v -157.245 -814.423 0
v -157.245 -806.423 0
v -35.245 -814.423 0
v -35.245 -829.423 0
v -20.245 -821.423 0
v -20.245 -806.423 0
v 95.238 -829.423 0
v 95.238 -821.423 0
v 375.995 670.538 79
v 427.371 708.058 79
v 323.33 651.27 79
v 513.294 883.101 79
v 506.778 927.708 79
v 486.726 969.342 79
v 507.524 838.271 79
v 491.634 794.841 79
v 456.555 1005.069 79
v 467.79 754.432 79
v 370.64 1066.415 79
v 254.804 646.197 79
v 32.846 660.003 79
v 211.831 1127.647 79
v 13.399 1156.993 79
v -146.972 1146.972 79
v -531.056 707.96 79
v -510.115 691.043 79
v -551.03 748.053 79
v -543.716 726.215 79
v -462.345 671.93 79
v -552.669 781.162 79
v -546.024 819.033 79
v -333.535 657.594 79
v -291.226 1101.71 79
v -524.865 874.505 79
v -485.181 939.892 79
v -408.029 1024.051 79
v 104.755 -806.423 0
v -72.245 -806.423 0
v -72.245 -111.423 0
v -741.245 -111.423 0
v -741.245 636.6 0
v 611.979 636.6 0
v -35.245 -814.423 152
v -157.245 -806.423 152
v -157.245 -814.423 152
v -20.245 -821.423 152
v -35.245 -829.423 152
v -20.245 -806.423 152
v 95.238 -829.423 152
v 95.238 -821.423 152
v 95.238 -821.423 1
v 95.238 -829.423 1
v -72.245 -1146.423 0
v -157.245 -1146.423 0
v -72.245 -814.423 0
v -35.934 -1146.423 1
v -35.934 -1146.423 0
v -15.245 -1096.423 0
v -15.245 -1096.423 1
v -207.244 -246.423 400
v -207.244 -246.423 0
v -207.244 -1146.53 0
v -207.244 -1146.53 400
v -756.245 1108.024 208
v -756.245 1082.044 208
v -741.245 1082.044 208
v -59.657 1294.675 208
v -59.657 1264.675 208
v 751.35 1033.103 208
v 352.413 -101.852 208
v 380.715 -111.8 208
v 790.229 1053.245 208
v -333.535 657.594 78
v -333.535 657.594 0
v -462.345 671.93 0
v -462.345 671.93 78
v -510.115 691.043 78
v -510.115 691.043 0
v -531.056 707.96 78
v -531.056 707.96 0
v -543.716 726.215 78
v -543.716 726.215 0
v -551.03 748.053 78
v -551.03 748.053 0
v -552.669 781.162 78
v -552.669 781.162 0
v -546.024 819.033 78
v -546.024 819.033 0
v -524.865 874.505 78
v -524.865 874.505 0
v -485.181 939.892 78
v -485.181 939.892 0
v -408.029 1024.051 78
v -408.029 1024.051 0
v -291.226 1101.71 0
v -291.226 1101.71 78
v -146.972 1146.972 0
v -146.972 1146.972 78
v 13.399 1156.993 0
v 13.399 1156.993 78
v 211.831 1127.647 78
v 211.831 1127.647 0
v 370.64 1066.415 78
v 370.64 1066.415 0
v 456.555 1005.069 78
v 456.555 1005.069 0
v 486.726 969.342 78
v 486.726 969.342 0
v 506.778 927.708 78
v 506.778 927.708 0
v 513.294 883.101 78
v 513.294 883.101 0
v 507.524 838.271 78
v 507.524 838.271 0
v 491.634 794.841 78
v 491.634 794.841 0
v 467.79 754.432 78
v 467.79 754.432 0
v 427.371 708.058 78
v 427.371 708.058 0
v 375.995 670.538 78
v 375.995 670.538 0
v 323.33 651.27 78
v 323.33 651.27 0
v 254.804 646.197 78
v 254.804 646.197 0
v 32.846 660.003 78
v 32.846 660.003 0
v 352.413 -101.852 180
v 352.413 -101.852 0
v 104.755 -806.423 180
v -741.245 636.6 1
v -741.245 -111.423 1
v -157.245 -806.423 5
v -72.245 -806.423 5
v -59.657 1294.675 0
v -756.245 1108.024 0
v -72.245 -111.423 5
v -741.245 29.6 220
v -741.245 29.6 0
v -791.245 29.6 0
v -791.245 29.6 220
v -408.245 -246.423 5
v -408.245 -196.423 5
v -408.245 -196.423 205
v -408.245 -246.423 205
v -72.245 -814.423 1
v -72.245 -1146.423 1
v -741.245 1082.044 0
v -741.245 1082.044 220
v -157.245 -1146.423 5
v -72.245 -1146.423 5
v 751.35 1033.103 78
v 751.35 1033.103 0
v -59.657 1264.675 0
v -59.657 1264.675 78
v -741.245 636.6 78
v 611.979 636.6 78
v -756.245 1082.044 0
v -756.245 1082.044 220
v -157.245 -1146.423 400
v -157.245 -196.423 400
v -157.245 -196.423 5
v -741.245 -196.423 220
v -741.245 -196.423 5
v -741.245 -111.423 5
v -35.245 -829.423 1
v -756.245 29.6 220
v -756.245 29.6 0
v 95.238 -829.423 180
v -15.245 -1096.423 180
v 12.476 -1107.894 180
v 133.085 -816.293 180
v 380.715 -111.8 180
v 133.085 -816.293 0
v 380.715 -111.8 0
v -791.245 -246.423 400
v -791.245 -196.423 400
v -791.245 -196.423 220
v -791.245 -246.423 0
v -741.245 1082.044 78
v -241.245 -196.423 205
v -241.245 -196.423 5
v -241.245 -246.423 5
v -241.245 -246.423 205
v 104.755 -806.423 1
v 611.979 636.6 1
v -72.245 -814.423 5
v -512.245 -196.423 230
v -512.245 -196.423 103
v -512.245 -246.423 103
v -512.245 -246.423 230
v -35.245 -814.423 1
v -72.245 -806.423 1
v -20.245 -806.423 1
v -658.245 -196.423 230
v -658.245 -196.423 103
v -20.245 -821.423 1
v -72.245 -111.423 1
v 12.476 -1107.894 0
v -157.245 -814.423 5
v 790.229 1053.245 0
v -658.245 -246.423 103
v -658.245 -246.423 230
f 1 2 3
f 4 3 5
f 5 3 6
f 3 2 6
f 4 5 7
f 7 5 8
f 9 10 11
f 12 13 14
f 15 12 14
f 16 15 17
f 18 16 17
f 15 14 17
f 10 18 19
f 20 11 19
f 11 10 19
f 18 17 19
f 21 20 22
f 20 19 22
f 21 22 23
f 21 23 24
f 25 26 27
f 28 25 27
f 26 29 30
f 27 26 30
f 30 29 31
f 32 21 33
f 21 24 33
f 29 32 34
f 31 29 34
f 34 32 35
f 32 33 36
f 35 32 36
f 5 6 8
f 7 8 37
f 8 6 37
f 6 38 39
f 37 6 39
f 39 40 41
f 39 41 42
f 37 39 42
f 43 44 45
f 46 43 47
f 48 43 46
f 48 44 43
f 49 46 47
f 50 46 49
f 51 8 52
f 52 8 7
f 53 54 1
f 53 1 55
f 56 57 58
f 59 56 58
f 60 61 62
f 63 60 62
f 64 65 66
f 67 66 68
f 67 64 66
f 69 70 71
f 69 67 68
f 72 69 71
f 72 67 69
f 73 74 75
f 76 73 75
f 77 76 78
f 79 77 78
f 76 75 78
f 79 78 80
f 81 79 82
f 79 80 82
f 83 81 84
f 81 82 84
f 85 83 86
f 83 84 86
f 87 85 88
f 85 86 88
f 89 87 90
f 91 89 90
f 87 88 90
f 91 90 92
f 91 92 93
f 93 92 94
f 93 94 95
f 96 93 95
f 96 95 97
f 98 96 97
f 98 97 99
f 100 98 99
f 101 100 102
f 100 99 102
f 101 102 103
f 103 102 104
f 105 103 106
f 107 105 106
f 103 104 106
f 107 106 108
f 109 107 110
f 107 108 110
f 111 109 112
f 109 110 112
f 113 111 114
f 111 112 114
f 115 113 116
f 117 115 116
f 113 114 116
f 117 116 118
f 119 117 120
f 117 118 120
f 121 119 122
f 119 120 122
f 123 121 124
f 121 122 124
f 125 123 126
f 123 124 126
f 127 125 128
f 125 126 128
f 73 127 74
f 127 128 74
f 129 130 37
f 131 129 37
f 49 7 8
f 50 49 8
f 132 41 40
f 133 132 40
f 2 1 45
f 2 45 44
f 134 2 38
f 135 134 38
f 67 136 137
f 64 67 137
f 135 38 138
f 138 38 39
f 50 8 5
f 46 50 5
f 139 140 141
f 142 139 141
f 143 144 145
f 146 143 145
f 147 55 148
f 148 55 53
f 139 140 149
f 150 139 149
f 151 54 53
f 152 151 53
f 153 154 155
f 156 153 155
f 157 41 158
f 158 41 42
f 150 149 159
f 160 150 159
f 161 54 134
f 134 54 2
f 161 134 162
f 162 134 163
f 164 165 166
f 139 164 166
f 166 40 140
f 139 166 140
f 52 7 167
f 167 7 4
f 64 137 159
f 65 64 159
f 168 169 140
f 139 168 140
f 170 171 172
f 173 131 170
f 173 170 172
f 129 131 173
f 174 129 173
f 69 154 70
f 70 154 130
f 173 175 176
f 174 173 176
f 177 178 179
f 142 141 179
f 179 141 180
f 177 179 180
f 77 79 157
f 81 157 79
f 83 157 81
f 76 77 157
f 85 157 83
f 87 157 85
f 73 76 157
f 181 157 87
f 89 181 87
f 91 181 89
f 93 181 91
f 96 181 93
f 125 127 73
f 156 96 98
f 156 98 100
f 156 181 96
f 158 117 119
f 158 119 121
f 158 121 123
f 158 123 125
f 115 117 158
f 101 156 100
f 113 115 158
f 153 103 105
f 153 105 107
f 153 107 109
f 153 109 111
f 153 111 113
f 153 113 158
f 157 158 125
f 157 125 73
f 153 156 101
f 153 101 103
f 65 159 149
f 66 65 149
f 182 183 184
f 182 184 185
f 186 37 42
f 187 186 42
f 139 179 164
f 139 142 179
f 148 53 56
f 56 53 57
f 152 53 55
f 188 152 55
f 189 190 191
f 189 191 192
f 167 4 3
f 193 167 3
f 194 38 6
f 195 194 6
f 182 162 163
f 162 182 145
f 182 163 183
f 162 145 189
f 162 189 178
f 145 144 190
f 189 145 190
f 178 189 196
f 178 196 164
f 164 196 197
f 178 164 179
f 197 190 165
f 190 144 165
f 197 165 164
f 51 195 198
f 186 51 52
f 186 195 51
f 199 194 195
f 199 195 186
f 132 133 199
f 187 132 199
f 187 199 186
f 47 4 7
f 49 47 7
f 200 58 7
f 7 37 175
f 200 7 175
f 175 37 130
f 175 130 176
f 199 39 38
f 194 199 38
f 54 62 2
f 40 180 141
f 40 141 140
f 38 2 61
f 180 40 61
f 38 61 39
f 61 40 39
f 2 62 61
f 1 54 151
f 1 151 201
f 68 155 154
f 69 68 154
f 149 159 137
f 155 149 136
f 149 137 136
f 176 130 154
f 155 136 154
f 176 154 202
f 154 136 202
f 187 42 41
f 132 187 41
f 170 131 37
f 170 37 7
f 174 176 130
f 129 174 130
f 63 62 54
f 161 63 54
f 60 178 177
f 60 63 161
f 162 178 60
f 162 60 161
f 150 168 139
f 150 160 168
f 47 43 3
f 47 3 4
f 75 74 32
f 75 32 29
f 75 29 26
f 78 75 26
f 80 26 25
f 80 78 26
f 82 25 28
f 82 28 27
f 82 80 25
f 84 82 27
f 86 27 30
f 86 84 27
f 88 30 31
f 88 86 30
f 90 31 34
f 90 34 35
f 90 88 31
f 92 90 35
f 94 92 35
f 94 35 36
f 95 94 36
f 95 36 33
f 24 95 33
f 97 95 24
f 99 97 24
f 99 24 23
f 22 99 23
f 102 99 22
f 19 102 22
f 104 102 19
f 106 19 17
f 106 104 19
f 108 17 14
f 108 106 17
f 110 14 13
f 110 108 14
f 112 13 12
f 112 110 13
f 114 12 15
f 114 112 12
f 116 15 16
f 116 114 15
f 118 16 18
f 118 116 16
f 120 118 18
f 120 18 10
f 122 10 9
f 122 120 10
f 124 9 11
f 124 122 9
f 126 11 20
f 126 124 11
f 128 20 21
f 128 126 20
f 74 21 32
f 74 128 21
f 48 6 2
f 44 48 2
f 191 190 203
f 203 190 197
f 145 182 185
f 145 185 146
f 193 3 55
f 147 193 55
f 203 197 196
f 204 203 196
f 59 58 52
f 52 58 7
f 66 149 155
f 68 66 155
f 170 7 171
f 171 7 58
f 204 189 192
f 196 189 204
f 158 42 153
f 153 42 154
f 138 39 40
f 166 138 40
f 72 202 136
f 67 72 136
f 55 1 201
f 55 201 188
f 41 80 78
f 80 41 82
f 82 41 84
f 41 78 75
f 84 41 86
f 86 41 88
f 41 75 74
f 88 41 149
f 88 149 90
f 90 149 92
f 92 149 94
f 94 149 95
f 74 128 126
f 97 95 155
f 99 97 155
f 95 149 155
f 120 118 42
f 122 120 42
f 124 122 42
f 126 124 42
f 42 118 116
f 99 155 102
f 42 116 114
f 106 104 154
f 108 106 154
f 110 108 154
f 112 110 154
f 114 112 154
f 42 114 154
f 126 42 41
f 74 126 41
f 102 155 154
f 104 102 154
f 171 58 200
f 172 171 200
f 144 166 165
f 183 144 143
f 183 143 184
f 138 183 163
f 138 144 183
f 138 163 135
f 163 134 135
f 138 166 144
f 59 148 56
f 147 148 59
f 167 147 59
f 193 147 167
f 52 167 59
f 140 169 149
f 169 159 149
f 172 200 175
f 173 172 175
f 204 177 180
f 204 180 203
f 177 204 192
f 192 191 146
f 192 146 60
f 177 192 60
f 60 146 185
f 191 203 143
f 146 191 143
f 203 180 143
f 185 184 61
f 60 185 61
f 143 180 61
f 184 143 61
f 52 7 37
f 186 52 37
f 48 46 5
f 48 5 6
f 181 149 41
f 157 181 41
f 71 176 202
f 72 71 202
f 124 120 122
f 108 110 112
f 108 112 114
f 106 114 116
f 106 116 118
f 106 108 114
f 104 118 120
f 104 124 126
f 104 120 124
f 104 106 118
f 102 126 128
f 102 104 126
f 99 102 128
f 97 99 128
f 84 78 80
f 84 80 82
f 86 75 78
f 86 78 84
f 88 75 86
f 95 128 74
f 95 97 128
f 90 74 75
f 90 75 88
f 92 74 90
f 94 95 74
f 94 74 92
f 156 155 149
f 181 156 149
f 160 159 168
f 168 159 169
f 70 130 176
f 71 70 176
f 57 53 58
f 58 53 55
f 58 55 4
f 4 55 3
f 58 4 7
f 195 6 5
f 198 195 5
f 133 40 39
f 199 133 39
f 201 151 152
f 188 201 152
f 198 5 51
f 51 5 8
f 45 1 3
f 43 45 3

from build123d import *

# Parameters (mm, degrees)
F1_DEPTH  = 78
F2_DEPTH  = 5
F0_W      = 85
F0_H      = 332
F3_DEPTH  = 220
F4_DEPTH  = 220
F5_DEPTH  = 400
F6_W      = 167
F6_H      = 200
F6_W_2    = 146
F6_H_2    = 127
F7_DEPTH  = 200
F8_DEPTH  = 208
F9_DEPTH  = 180
F0_H_2    = 8
F0_W_2    = 37
F10_DEPTH = 152
F11_DEPTH = 79
F12_DEPTH = 1
F13_DEPTH = 1


# Not quite as in the source:
# - a feature names something its author has since deleted; it is built from what else it names


with BuildPart() as f1:
    # F0 (on Top) → F1 (new body)
    with BuildSketch(Plane.XY):
        Polygon((-741.2445402145, 1082.0436550353), (-741.2445402145, 636.6001187265), (85.7554597855, 636.6001187265), (611.9789830182, 636.6001187265), (751.3498777895, 1033.1027120147), (-59.6568852941, 1264.6745167422), align=None)
        with BuildLine():
            add(Edge.make_bspline(
                [(-333.5347517591, 657.5935368718), (-438.7176092773, 660.9860382691), (-660.4423976157, 691.4819966509), (-306.0983067038, 1304.6981771282), (678.1962489209, 1041.8383423681), (388.5420616008, 608.4940348272), (127.1086766673, 676.0293060865), (-184.2398763148, 652.7782743329), (-333.5347517591, 657.5935368718)],
                knots=[0, 0, 0, 0, 0.1269070803, 0.3114768491, 0.5429923215, 0.687036639, 0.8198701082, 1, 1, 1, 1], degree=3))
        make_face(mode=Mode.SUBTRACT)
    extrude(amount=F1_DEPTH)


with BuildPart() as f2:
    # F0 (on Top) → F2 (new body)
    with BuildSketch(Plane.XY):
        Polygon((-157.2445402145, -196.4231370871), (-157.2445402145, -333.8946764966), (-157.2445402145, -806.4231370871), (-72.2445402145, -806.4231370871), (-72.2445402145, -360.4946641021), (-72.2445402145, -111.4231370871), (-741.2445402145, -111.4231370871), (-741.2445402145, -196.4231370871), align=None)
    extrude(amount=F2_DEPTH)

    # F0 (on Top) → F3 (join)
    with BuildSketch(Plane.XY):
        Polygon((-791.2445402145, -196.4231370871), (-741.2445402145, -196.4231370871), (-741.2445402145, -111.4231370871), (-741.2445402145, 29.6001187267), (-756.2445402145, 29.6001187267), (-791.2445402145, 29.6001187267), align=None)
    extrude(amount=F3_DEPTH)

    # F0 (on Top) → F5 (join)
    with BuildSketch(Plane.XY):
        Polygon((-157.2445402145, -806.4231370871), (-157.2445402145, -333.8946764966), (-157.2445402145, -196.4231370871), (-741.2445402145, -196.4231370871), (-791.2445402145, -196.4231370871), (-791.2445402145, -246.4231370871), (-207.2444250903, -246.4231370871), (-207.2444250903, -1146.5304329774), (-157.2445402145, -1146.4231370871), (-157.2445402145, -814.4231370871), align=None)
    extrude(amount=F5_DEPTH)

    # F6 (on face) → F7 (cut)
    with BuildSketch(Plane(origin=(0, -196.4231370871, 0), x_dir=(-1, 0, 0), z_dir=(0, 1, 0))):
        with Locations((324.7445402145, 105)):
            Rectangle(F6_W, F6_H)
        with Locations((585.2445402145, 166.5)):
            Rectangle(F6_W_2, F6_H_2)
    extrude(amount=-F7_DEPTH, mode=Mode.SUBTRACT)


with BuildPart() as f2b:
    # F0 (on Top) → F2, piece 2 (new body)
    with BuildSketch(Plane.XY):
        with Locations((-114.7445402145, -980.4231370871)):
            Rectangle(F0_W, F0_H)
    extrude(amount=F2_DEPTH)


with BuildPart() as f4:
    # F0 (on Top) → F4 (new body)
    with BuildSketch(Plane.XY):
        Polygon((-756.2445402145, 29.6001187267), (-741.2445402145, 29.6001187267), (-741.2445402145, 636.6001187265), (-741.2445402145, 1082.0436550353), (-756.2445402145, 1082.0436550353), align=None)
    extrude(amount=F4_DEPTH)


with BuildPart() as f8:
    # F0 (on Top) → F8 (new body)
    with BuildSketch(Plane.XY):
        Polygon((-756.2445402145, 1082.0436550353), (-741.2445402145, 1082.0436550353), (-59.6568852941, 1264.6745167422), (751.3498777895, 1033.1027120147), (611.9789830182, 636.6001187265), (536.7554597855, 422.5932983858), (352.412635156, -101.8519822417), (380.7150506744, -111.8002979444), (790.2292767004, 1053.2451157589), (-59.6568852941, 1294.6745167422), (-756.2445402145, 1108.0244171488), align=None)
    extrude(amount=F8_DEPTH)


with BuildPart() as f9:
    # F0 (on Top) → F9 (new body)
    with BuildSketch(Plane.XY):
        Polygon((95.2382184061, -829.4231370871), (-15.2445402145, -1096.4231370871), (12.4759647581, -1107.8936908689), (133.0854861388, -816.292767618), (380.7150506744, -111.8002979444), (352.412635156, -101.8519822417), (104.7554597855, -806.4231370871), align=None)
    extrude(amount=F9_DEPTH)


with BuildPart() as f10:
    # F0 (on Top) → F10 (new body)
    with BuildSketch(Plane.XY):
        with Locations((-114.7445402145, -810.4231370871)):
            Rectangle(F0_W, F0_H_2)
        with Locations((-53.7445402145, -810.4231370871)):
            Rectangle(F0_W_2, F0_H_2)
        Polygon((-20.2445402145, -821.4231370871), (-35.2445402145, -821.4231370871), (-35.2445402145, -829.4231370871), (95.2382184061, -829.4231370871), (95.2382184061, -821.4231370871), align=None)
        Polygon((-20.2445402145, -806.4231370871), (-35.2445402145, -806.4231370871), (-35.2445402145, -814.4231370871), (-35.2445402145, -821.4231370871), (-20.2445402145, -821.4231370871), align=None)
    extrude(amount=F10_DEPTH)


with BuildPart() as f11:
    # F0 (on Top) → F11 (new body)
    with BuildSketch(Plane.XY):
        with BuildLine():
            add(Edge.make_bspline(
                [(-333.5347517591, 657.5935368718), (-438.7176092773, 660.9860382691), (-660.4423976157, 691.4819966509), (-306.0983067038, 1304.6981771282), (678.1962489209, 1041.8383423681), (388.5420616008, 608.4940348272), (127.1086766673, 676.0293060865), (-184.2398763148, 652.7782743329), (-333.5347517591, 657.5935368718)],
                knots=[0, 0, 0, 0, 0.1269070803, 0.3114768491, 0.5429923215, 0.687036639, 0.8198701082, 1, 1, 1, 1], degree=3))
        make_face()
    extrude(amount=F11_DEPTH)


with BuildPart() as f12:
    # F0 (on Top) → F12 (new body)
    with BuildSketch(Plane.XY):
        Polygon((-72.2445402145, -360.4946641021), (-72.2445402145, -806.4231370871), (-35.2445402145, -806.4231370871), (-20.2445402145, -806.4231370871), (-20.2445402145, -821.4231370871), (95.2382184061, -821.4231370871), (95.2382184061, -829.4231370871), (104.7554597855, -806.4231370871), (352.412635156, -101.8519822417), (536.7554597855, 422.5932983858), (430.7554597855, 422.5932983858), (310.7554597855, 422.5932983858), (85.7554597855, 422.5932983858), (85.7554597855, 636.6001187265), (-741.2445402145, 636.6001187265), (-741.2445402145, 29.6001187267), (-741.2445402145, -111.4231370871), (-72.2445402145, -111.4231370871), align=None)
        Polygon((611.9789830182, 636.6001187265), (85.7554597855, 636.6001187265), (85.7554597855, 422.5932983858), (310.7554597855, 422.5932983858), (430.7554597855, 422.5932983858), (536.7554597855, 422.5932983858), align=None)
    extrude(amount=F12_DEPTH)


with BuildPart() as f13:
    # F0 (on Top) → F13 (new body)
    with BuildSketch(Plane.XY):
        Polygon((-35.2445402145, -814.4231370871), (-72.2445402145, -814.4231370871), (-72.2445402145, -1146.4231370871), (-35.934195387, -1146.4231370871), (-15.2445402145, -1096.4231370871), (95.2382184061, -829.4231370871), (-35.2445402145, -829.4231370871), (-35.2445402145, -821.4231370871), align=None)
    extrude(amount=F13_DEPTH)


solid = Compound([f1.part, f2.part, f2b.part, f4.part, f8.part, f9.part, f10.part, f11.part, f12.part, f13.part])
